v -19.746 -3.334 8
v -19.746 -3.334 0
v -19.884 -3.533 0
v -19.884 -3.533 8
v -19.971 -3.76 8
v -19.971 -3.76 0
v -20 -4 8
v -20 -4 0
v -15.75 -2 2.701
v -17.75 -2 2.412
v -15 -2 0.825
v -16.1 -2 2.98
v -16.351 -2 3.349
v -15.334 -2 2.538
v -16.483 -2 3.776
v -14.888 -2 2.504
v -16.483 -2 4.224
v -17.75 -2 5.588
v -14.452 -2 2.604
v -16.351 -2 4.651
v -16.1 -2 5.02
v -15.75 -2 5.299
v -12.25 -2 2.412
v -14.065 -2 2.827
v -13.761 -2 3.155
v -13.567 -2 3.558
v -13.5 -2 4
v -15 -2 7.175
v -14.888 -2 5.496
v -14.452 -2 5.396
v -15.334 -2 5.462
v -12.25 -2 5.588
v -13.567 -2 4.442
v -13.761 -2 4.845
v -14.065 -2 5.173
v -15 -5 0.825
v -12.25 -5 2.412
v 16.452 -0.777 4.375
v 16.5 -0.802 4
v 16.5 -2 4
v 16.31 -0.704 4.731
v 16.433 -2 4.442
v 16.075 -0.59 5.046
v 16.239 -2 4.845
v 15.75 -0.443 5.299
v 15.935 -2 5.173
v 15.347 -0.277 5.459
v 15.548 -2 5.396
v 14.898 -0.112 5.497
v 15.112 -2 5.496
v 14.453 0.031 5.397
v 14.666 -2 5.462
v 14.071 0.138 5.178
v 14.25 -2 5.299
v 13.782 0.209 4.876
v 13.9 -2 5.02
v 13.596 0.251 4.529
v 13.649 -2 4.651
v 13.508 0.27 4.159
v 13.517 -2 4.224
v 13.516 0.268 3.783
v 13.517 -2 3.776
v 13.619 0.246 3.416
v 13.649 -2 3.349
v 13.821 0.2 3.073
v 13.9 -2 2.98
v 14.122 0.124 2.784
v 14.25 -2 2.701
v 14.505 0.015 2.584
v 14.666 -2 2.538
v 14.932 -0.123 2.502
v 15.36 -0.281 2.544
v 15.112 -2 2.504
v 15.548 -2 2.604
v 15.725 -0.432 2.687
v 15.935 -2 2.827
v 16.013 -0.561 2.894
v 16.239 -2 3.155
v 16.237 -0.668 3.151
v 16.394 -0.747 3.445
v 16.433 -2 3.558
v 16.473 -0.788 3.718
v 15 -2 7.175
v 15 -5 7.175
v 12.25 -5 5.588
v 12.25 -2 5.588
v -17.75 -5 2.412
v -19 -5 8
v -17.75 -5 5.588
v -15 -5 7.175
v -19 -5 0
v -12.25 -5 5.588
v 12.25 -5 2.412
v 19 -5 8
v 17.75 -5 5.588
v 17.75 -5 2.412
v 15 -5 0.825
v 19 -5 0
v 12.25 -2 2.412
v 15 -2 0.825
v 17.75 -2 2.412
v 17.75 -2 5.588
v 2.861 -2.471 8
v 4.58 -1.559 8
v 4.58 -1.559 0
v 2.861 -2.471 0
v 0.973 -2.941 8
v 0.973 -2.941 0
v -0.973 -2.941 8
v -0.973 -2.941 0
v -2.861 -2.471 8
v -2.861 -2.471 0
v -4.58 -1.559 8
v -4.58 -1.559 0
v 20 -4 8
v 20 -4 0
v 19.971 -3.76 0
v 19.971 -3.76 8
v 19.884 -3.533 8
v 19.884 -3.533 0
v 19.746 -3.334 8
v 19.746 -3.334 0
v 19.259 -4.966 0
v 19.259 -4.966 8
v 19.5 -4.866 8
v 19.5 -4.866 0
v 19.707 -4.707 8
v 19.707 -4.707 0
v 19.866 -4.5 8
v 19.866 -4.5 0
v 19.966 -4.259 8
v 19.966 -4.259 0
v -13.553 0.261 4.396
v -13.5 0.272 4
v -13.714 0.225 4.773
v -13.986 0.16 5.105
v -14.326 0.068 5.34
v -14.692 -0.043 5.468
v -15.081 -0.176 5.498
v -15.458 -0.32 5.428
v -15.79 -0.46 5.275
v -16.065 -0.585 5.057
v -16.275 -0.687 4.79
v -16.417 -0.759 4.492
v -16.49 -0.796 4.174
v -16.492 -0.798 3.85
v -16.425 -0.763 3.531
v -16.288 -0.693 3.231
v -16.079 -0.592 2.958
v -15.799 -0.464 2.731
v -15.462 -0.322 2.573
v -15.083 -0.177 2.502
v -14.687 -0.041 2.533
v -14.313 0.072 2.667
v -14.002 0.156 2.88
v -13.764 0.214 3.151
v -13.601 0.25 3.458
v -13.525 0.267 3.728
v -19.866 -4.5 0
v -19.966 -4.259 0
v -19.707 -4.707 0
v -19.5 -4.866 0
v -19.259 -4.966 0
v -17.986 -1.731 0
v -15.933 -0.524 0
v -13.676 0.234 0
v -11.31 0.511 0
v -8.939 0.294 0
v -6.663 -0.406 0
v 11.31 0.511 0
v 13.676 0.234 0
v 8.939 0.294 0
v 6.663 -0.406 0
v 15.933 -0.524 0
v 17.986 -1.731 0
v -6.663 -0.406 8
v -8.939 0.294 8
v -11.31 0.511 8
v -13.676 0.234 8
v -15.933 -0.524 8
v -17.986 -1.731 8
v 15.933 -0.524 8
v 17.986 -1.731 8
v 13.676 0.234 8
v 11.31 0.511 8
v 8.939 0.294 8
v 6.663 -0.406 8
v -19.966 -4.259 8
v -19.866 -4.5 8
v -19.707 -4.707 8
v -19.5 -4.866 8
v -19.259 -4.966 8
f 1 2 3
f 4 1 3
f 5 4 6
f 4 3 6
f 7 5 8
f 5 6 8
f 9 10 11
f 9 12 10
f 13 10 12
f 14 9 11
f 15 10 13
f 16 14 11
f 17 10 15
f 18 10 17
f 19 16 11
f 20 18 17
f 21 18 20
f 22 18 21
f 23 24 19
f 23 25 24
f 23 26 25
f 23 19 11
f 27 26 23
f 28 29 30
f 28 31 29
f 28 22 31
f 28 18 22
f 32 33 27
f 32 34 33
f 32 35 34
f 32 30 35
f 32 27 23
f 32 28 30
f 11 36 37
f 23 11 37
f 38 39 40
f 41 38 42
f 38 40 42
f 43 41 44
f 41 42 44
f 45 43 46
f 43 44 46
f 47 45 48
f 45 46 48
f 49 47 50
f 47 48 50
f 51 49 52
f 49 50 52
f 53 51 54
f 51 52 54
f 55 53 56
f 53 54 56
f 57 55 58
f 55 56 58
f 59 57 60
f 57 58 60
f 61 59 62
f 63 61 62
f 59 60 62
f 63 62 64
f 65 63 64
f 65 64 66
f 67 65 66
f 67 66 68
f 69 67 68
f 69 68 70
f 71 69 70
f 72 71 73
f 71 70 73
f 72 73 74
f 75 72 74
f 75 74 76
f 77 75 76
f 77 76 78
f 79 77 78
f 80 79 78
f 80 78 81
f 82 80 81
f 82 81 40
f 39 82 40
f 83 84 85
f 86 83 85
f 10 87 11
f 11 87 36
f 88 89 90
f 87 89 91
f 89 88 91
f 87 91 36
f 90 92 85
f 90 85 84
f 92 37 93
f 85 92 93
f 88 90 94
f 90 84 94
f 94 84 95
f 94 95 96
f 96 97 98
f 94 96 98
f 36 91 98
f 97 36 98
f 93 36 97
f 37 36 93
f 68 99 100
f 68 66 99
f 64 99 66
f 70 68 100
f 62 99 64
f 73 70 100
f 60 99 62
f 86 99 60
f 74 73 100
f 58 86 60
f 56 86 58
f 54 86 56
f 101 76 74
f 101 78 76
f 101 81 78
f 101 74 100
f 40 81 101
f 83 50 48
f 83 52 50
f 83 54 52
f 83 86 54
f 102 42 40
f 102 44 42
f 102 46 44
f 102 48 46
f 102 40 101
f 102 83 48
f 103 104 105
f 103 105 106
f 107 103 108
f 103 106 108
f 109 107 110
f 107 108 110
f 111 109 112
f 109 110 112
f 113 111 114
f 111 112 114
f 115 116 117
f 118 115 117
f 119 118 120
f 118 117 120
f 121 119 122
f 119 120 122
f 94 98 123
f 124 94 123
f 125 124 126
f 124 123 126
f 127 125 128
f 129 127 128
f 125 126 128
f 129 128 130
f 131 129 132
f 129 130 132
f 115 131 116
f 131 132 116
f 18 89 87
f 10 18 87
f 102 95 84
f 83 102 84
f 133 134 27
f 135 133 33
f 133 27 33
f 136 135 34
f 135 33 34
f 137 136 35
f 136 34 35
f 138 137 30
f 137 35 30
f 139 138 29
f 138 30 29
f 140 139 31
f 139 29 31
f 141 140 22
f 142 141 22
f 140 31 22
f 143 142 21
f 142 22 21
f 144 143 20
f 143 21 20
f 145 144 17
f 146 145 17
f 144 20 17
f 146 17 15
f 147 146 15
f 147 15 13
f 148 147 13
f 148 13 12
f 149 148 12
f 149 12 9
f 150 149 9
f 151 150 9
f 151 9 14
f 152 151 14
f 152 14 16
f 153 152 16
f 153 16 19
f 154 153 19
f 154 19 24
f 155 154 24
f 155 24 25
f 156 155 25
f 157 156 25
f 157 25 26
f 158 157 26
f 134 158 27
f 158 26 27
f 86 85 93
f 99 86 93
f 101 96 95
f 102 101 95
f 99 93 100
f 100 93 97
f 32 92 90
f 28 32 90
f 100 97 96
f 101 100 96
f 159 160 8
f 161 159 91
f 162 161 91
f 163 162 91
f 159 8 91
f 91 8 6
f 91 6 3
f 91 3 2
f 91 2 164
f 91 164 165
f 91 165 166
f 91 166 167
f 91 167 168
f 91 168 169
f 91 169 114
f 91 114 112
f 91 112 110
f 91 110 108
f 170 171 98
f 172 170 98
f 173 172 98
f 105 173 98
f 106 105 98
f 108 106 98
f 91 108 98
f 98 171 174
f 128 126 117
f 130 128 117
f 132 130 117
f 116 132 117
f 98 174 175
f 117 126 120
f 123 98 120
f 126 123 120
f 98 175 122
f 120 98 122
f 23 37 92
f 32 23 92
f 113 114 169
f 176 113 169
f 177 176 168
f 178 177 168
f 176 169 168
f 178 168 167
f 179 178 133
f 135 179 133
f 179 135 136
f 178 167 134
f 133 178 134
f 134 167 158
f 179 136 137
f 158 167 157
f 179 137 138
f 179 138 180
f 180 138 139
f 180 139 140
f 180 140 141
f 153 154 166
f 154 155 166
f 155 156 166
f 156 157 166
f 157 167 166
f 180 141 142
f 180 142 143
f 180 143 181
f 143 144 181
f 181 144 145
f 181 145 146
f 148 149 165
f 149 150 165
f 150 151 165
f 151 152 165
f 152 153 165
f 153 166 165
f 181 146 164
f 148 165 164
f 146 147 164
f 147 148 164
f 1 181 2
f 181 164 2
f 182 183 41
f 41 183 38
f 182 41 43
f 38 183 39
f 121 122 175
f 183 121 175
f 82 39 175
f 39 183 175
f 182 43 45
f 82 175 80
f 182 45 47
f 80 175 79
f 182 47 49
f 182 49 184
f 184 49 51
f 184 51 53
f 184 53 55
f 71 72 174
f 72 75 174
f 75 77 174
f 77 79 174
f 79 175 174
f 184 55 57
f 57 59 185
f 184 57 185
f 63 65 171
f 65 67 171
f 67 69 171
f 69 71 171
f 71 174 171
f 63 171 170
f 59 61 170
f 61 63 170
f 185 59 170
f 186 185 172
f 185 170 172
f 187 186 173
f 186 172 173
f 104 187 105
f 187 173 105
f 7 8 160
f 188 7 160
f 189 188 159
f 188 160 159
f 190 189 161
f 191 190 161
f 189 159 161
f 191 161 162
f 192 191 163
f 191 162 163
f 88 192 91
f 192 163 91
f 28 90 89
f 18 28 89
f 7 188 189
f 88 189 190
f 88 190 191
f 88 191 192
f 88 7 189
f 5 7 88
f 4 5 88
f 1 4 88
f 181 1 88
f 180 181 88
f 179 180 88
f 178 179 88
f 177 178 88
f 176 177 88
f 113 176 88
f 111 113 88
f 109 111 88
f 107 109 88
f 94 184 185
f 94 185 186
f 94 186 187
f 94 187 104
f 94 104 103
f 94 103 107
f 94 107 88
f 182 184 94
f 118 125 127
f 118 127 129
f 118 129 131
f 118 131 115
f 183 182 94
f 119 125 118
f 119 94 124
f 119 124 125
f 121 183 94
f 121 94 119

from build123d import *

# Parameters (mm, degrees)
F1_DEPTH = 8
F2_R     = 1.5
F3_DEPTH = 25
F5_DEPTH = 3


with BuildPart() as f1:
    # F0 (on Top) → F1 (new body)
    with BuildSketch(Plane.XY):
        with BuildLine():
            ThreePointArc((-1.3455948979, -5), (-2.7842223612, -3.1118759439), (-4.5798539423, -1.5593397432))
            ThreePointArc((-4.5798539423, -1.5593397432), (-12.5002387345, 0.4336426528), (-19.7463435047, -3.3344390538))
            ThreePointArc((-19.7463435047, -3.3344390538), (-18.6438704622, -3.0655634038), (-18, -4))
            ThreePointArc((-18, -4), (-18.2928932188, -4.7071067812), (-19, -5))
            Line((-19, -5), (-1.3455948979, -5))
        make_face()
        with BuildLine():
            ThreePointArc((-18, -4), (-18.6438704622, -3.0655634038), (-19.7463435047, -3.3344390538))
            ThreePointArc((-19.7463435047, -3.3344390538), (-19.9344365962, -3.6438704622), (-20, -4))
            ThreePointArc((-20, -4), (-19.7071067812, -4.7071067812), (-19, -5))
            ThreePointArc((-19, -5), (-18.2928932188, -4.7071067812), (-18, -4))
        make_face()
        with BuildLine():
            ThreePointArc((1.3455948979, -5), (2.7842223453, -3.1118759608), (4.5798539043, -1.5593397698))
            ThreePointArc((4.5798539043, -1.5593397698), (-2.32e-08, -3), (-4.5798539423, -1.5593397432))
            ThreePointArc((-4.5798539423, -1.5593397432), (-2.7842223612, -3.1118759439), (-1.3455948979, -5))
            Line((-1.3455948979, -5), (1.3455948979, -5))
        make_face()
        with BuildLine():
            ThreePointArc((19.7463434531, -3.3344389961), (12.5002386731, 0.43364266), (4.5798539043, -1.5593397698))
            ThreePointArc((4.5798539043, -1.5593397698), (2.7842223453, -3.1118759608), (1.3455948979, -5))
            Line((1.3455948979, -5), (19, -5))
            ThreePointArc((19, -5), (18.0874319193, -3.5910751927), (19.7463434531, -3.3344389961))
        make_face()
        with BuildLine():
            ThreePointArc((19, -5), (19.7071067812, -4.7071067812), (20, -4))
            ThreePointArc((20, -4), (19.9344365824, -3.6438704261), (19.7463434531, -3.3344389961))
            ThreePointArc((19.7463434531, -3.3344389961), (18.0874319193, -3.5910751927), (19, -5))
        make_face()
    extrude(amount=F1_DEPTH)

    # F2 (on face) → F3 (cut)
    with BuildSketch(Plane.XZ.offset(5)):
        with Locations((-15, 4)):
            Circle(F2_R)
        with Locations((15, 4)):
            Circle(F2_R)
    extrude(amount=-F3_DEPTH, mode=Mode.SUBTRACT)

    # F4 (on face) → F5 (cut)
    with BuildSketch(Plane.XZ.offset(5)):
        Polygon((-12.25, 2.4122867597), (-12.25, 5.5877132403), (-15, 7.1754264805), (-17.75, 5.5877132403), (-17.75, 2.4122867597), (-15, 0.8245735195), align=None)
        Polygon((12.25, 5.5877132403), (12.25, 2.4122867597), (15, 0.8245735195), (17.75, 2.4122867597), (17.75, 5.5877132403), (15, 7.1754264805), align=None)
    extrude(amount=-F5_DEPTH, mode=Mode.SUBTRACT)


solid = f1.part
